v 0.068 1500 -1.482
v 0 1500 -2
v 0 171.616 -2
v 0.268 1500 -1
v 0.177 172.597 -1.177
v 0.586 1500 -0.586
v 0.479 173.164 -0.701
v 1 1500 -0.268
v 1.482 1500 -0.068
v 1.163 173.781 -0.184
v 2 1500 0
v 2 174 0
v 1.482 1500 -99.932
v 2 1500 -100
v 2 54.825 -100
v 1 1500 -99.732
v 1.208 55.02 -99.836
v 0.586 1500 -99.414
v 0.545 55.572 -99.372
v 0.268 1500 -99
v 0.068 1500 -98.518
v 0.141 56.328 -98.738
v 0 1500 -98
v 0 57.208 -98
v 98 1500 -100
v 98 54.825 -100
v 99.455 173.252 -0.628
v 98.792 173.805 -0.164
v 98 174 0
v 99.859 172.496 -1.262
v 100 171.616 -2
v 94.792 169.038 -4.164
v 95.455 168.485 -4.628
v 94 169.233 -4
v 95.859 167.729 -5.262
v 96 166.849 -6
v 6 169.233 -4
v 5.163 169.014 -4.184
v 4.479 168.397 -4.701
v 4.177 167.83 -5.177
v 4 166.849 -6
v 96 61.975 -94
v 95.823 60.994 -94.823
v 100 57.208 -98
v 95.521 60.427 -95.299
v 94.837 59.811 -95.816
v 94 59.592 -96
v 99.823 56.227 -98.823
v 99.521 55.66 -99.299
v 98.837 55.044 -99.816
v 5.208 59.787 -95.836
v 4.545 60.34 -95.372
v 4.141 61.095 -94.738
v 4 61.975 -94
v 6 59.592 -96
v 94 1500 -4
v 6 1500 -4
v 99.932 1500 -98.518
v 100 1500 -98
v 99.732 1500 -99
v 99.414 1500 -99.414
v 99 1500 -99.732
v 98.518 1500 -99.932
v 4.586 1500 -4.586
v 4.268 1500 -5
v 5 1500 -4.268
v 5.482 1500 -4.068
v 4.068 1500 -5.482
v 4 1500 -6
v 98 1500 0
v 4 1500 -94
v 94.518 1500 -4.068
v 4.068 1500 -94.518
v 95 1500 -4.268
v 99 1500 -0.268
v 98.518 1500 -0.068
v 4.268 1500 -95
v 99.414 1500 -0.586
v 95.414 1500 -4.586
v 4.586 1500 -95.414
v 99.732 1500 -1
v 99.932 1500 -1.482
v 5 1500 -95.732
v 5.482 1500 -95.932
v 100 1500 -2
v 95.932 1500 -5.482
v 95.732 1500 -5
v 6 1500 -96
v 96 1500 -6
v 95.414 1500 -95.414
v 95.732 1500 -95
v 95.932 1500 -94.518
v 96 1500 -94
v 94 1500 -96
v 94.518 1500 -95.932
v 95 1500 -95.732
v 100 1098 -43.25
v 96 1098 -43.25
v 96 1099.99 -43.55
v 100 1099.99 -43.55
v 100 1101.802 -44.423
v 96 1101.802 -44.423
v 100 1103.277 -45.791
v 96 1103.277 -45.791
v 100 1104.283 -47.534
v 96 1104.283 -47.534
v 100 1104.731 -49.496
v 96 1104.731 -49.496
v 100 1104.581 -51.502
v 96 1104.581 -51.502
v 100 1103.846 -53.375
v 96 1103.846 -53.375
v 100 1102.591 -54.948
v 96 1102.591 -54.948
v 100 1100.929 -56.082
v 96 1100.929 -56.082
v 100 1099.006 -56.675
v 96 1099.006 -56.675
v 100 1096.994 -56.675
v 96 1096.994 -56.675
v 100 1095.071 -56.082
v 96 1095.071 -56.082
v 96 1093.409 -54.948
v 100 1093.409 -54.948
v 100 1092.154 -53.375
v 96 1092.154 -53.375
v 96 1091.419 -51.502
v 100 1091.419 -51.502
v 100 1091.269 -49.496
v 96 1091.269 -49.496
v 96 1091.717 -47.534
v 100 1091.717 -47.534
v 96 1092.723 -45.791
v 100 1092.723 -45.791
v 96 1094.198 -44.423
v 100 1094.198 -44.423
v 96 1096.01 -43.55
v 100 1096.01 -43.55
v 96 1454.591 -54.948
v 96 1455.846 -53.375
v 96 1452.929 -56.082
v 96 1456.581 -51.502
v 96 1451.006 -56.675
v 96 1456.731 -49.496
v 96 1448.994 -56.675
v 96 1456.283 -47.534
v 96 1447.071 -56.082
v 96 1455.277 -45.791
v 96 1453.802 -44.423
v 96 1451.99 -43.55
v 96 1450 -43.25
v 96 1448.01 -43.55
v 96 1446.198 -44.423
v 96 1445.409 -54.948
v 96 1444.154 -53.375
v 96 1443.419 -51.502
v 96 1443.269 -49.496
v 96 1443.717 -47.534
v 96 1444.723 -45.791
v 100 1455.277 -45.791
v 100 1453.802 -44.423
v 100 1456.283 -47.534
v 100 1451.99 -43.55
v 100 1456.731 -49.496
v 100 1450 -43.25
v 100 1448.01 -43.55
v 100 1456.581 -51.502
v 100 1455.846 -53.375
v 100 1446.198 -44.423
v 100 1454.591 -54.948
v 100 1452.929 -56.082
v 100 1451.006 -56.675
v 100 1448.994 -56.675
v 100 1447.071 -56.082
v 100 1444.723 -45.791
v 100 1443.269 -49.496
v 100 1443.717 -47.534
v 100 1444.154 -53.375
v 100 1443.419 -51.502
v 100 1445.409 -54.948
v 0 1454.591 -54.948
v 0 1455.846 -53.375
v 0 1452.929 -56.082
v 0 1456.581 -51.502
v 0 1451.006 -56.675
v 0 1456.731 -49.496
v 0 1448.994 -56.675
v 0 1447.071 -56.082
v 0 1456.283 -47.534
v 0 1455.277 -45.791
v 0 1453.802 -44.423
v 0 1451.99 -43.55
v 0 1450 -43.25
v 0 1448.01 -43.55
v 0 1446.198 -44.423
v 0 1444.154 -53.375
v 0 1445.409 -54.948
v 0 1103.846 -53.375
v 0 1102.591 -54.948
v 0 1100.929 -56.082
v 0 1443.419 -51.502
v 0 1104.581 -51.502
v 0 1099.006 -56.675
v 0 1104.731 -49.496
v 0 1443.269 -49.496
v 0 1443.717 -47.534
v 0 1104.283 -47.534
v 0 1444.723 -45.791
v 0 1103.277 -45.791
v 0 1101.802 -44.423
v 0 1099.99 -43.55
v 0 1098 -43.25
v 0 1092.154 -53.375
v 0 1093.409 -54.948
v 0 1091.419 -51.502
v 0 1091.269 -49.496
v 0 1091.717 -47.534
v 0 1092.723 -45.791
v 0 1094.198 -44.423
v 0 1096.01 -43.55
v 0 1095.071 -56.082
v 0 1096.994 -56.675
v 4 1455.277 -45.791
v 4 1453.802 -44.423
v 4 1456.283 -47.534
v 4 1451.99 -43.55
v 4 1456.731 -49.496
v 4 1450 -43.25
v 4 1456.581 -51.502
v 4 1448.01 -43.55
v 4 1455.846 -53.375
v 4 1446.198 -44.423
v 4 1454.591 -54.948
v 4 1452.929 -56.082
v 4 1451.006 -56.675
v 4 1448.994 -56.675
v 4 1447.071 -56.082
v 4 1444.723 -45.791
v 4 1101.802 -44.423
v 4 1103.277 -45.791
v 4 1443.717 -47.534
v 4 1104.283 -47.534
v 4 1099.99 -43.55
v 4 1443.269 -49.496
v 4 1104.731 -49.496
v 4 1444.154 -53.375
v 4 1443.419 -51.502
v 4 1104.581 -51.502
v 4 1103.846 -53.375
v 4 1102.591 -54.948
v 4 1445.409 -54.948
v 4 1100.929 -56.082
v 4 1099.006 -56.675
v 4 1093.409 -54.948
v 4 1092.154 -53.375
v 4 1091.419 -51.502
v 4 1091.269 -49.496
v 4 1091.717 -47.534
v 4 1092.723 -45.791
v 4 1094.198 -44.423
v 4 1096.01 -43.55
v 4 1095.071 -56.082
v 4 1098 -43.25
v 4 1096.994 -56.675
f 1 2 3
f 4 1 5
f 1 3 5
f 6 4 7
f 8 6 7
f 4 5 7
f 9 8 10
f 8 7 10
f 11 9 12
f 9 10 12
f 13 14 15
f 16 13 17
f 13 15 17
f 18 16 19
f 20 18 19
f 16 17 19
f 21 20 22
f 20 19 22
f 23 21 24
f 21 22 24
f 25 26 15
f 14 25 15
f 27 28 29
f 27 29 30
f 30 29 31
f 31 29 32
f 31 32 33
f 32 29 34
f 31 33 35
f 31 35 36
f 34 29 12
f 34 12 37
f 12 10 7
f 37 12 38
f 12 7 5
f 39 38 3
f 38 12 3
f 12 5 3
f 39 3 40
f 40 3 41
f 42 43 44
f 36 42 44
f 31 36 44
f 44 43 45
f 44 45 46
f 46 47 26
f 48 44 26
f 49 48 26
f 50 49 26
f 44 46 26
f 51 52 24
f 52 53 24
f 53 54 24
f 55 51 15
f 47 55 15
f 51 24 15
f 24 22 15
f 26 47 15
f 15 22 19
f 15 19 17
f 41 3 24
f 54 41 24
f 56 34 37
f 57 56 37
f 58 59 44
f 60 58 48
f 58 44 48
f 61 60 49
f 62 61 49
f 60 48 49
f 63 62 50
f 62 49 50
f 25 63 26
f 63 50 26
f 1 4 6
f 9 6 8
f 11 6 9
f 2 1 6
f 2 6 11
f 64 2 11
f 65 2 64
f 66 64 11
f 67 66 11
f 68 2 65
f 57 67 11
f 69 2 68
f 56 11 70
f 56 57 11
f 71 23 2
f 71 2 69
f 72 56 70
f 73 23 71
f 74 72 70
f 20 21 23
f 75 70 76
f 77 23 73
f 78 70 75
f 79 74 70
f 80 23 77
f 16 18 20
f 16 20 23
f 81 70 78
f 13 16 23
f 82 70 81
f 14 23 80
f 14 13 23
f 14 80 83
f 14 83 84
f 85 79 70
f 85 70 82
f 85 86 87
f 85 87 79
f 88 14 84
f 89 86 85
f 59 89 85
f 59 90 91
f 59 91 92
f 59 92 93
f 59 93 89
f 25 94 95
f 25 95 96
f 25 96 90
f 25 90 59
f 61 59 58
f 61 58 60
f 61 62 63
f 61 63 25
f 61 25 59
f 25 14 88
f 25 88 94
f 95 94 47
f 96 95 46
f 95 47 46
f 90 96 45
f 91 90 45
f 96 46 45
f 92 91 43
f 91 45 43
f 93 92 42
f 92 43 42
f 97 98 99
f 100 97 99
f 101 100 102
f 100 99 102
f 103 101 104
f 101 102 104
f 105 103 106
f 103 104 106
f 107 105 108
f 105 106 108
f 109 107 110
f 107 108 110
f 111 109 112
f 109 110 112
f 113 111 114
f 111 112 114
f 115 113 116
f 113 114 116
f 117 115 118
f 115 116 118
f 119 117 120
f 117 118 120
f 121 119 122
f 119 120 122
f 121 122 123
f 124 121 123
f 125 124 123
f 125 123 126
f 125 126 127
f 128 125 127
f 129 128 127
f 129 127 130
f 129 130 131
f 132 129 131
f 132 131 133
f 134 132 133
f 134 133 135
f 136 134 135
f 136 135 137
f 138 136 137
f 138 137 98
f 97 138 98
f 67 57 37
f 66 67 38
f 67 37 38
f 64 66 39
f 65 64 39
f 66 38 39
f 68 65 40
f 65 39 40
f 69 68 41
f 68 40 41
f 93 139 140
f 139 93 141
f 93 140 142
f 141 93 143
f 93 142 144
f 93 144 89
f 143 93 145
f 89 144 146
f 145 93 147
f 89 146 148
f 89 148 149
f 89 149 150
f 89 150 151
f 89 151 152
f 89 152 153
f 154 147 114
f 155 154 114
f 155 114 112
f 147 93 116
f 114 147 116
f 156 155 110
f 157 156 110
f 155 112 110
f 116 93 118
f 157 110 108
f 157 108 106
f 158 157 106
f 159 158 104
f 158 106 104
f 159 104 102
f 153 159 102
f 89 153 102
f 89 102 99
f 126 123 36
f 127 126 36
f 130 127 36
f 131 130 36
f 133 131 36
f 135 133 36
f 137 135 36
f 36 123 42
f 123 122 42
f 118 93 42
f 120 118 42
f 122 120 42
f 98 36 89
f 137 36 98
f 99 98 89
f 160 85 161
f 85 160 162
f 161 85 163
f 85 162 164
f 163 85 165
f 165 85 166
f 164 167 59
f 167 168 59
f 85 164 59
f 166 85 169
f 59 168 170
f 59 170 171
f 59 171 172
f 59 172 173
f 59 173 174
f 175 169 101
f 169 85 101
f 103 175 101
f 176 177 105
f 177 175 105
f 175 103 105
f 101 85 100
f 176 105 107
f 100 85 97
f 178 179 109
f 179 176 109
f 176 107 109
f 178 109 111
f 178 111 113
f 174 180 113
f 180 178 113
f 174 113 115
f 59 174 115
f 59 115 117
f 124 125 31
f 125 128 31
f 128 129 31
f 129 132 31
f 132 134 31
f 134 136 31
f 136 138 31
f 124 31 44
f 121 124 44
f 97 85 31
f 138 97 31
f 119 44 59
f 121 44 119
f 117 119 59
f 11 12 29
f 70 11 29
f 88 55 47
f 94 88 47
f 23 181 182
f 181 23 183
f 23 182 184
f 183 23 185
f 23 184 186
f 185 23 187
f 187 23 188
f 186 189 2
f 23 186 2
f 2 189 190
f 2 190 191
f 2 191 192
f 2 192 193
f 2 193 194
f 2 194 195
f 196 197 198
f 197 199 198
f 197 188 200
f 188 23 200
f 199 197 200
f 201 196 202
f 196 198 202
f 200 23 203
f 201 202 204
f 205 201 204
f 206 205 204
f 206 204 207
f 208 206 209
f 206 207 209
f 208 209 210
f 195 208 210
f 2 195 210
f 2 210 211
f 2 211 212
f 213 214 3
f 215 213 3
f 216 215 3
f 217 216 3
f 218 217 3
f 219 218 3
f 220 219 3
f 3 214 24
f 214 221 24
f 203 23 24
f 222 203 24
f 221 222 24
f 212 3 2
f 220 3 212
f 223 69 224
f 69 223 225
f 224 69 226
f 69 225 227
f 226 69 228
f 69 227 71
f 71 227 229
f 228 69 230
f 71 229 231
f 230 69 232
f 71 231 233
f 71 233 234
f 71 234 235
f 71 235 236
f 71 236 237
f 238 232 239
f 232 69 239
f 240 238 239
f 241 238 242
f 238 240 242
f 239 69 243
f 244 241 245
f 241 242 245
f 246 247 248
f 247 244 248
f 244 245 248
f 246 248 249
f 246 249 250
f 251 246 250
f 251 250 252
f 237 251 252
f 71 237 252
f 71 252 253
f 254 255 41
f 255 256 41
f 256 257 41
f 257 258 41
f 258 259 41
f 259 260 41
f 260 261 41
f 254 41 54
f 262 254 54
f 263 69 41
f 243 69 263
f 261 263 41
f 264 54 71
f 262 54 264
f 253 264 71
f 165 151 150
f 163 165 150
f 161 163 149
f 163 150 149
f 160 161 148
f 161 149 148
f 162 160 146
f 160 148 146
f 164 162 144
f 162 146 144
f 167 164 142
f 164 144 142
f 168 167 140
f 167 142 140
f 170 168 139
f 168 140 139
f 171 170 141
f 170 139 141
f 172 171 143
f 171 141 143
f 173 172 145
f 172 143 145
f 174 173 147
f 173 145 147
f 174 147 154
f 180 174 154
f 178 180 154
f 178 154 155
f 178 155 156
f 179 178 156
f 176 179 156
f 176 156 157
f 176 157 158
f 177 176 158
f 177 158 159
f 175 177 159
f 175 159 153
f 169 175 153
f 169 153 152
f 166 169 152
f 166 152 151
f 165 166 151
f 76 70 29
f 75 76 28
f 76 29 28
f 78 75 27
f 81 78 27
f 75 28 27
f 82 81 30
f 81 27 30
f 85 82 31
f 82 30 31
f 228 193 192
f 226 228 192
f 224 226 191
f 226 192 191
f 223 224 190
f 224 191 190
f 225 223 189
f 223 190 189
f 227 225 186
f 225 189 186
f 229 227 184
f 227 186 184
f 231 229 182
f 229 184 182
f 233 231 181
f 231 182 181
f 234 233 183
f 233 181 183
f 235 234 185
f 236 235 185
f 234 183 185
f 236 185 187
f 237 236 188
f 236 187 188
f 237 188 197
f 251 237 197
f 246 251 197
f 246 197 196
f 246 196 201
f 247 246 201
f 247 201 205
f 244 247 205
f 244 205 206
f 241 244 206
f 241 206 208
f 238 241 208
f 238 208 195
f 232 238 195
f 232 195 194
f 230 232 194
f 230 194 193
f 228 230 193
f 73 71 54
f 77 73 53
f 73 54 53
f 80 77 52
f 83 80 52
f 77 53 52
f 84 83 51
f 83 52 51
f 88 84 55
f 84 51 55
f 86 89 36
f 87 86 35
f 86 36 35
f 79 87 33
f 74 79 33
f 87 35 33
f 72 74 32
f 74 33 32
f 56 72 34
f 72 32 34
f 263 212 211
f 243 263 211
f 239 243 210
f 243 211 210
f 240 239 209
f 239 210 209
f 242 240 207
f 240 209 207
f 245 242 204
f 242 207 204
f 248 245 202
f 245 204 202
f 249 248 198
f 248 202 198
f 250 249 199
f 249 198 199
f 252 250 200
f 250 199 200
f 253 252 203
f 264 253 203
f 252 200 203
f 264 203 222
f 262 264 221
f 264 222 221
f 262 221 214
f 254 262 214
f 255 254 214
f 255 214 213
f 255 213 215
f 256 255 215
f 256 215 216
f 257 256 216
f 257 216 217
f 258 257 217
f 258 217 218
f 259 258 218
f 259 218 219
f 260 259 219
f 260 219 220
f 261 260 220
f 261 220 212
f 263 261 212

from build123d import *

# Parameters (mm, degrees)
BOSS_EXTRU_1_DEPTH      = 1500
ESQUISSE4_R             = 6.75
ENL_V_MAT_EXTRU_1_DEPTH = 1507.651917332


with BuildPart() as part:
    # Esquisse2 → Boss.-Extru.1 (new body)
    with BuildSketch(Plane(origin=(0, 0, 0), x_dir=(1, 0, 0), z_dir=(0, 1, 0))):
        with BuildLine():
            Line((2, 0), (98, 0))
            ThreePointArc((98, 0), (99.414213562, 0.585786438), (100, 2))
            Line((100, 2), (100, 98))
            ThreePointArc((100, 98), (99.414213562, 99.414213562), (98, 100))
            Line((98, 100), (2, 100))
            ThreePointArc((2, 100), (0.585786438, 99.414213562), (0, 98))
            Line((0, 98), (0, 2))
            ThreePointArc((0, 2), (0.585786438, 0.585786438), (2, 0))
        make_face()
        with BuildLine():
            Line((6, 96), (94, 96))
            ThreePointArc((94, 96), (95.414213562, 95.414213562), (96, 94))
            Line((96, 94), (96, 6))
            ThreePointArc((96, 6), (95.414213562, 4.585786438), (94, 4))
            Line((94, 4), (6, 4))
            ThreePointArc((6, 4), (4.585786438, 4.585786438), (4, 6))
            Line((4, 6), (4, 94))
            ThreePointArc((4, 94), (4.585786438, 95.414213562), (6, 96))
        make_face(mode=Mode.SUBTRACT)
    extrude(amount=BOSS_EXTRU_1_DEPTH)

    # Esquisse4 → Enlèv. mat.-Extru.1 (cut, through all)
    with BuildSketch(Plane.ZY):
        with Locations((-50, 1450)):
            Circle(ESQUISSE4_R)
        with Locations((-50, 1098)):
            Circle(ESQUISSE4_R)
        Polygon((0, 174), (-165.464535812, -23.192955001), (56.265885145, -23.192955001), (56.265885145, 174), align=None)
    extrude(amount=-ENL_V_MAT_EXTRU_1_DEPTH, mode=Mode.SUBTRACT)


solid = part.part
